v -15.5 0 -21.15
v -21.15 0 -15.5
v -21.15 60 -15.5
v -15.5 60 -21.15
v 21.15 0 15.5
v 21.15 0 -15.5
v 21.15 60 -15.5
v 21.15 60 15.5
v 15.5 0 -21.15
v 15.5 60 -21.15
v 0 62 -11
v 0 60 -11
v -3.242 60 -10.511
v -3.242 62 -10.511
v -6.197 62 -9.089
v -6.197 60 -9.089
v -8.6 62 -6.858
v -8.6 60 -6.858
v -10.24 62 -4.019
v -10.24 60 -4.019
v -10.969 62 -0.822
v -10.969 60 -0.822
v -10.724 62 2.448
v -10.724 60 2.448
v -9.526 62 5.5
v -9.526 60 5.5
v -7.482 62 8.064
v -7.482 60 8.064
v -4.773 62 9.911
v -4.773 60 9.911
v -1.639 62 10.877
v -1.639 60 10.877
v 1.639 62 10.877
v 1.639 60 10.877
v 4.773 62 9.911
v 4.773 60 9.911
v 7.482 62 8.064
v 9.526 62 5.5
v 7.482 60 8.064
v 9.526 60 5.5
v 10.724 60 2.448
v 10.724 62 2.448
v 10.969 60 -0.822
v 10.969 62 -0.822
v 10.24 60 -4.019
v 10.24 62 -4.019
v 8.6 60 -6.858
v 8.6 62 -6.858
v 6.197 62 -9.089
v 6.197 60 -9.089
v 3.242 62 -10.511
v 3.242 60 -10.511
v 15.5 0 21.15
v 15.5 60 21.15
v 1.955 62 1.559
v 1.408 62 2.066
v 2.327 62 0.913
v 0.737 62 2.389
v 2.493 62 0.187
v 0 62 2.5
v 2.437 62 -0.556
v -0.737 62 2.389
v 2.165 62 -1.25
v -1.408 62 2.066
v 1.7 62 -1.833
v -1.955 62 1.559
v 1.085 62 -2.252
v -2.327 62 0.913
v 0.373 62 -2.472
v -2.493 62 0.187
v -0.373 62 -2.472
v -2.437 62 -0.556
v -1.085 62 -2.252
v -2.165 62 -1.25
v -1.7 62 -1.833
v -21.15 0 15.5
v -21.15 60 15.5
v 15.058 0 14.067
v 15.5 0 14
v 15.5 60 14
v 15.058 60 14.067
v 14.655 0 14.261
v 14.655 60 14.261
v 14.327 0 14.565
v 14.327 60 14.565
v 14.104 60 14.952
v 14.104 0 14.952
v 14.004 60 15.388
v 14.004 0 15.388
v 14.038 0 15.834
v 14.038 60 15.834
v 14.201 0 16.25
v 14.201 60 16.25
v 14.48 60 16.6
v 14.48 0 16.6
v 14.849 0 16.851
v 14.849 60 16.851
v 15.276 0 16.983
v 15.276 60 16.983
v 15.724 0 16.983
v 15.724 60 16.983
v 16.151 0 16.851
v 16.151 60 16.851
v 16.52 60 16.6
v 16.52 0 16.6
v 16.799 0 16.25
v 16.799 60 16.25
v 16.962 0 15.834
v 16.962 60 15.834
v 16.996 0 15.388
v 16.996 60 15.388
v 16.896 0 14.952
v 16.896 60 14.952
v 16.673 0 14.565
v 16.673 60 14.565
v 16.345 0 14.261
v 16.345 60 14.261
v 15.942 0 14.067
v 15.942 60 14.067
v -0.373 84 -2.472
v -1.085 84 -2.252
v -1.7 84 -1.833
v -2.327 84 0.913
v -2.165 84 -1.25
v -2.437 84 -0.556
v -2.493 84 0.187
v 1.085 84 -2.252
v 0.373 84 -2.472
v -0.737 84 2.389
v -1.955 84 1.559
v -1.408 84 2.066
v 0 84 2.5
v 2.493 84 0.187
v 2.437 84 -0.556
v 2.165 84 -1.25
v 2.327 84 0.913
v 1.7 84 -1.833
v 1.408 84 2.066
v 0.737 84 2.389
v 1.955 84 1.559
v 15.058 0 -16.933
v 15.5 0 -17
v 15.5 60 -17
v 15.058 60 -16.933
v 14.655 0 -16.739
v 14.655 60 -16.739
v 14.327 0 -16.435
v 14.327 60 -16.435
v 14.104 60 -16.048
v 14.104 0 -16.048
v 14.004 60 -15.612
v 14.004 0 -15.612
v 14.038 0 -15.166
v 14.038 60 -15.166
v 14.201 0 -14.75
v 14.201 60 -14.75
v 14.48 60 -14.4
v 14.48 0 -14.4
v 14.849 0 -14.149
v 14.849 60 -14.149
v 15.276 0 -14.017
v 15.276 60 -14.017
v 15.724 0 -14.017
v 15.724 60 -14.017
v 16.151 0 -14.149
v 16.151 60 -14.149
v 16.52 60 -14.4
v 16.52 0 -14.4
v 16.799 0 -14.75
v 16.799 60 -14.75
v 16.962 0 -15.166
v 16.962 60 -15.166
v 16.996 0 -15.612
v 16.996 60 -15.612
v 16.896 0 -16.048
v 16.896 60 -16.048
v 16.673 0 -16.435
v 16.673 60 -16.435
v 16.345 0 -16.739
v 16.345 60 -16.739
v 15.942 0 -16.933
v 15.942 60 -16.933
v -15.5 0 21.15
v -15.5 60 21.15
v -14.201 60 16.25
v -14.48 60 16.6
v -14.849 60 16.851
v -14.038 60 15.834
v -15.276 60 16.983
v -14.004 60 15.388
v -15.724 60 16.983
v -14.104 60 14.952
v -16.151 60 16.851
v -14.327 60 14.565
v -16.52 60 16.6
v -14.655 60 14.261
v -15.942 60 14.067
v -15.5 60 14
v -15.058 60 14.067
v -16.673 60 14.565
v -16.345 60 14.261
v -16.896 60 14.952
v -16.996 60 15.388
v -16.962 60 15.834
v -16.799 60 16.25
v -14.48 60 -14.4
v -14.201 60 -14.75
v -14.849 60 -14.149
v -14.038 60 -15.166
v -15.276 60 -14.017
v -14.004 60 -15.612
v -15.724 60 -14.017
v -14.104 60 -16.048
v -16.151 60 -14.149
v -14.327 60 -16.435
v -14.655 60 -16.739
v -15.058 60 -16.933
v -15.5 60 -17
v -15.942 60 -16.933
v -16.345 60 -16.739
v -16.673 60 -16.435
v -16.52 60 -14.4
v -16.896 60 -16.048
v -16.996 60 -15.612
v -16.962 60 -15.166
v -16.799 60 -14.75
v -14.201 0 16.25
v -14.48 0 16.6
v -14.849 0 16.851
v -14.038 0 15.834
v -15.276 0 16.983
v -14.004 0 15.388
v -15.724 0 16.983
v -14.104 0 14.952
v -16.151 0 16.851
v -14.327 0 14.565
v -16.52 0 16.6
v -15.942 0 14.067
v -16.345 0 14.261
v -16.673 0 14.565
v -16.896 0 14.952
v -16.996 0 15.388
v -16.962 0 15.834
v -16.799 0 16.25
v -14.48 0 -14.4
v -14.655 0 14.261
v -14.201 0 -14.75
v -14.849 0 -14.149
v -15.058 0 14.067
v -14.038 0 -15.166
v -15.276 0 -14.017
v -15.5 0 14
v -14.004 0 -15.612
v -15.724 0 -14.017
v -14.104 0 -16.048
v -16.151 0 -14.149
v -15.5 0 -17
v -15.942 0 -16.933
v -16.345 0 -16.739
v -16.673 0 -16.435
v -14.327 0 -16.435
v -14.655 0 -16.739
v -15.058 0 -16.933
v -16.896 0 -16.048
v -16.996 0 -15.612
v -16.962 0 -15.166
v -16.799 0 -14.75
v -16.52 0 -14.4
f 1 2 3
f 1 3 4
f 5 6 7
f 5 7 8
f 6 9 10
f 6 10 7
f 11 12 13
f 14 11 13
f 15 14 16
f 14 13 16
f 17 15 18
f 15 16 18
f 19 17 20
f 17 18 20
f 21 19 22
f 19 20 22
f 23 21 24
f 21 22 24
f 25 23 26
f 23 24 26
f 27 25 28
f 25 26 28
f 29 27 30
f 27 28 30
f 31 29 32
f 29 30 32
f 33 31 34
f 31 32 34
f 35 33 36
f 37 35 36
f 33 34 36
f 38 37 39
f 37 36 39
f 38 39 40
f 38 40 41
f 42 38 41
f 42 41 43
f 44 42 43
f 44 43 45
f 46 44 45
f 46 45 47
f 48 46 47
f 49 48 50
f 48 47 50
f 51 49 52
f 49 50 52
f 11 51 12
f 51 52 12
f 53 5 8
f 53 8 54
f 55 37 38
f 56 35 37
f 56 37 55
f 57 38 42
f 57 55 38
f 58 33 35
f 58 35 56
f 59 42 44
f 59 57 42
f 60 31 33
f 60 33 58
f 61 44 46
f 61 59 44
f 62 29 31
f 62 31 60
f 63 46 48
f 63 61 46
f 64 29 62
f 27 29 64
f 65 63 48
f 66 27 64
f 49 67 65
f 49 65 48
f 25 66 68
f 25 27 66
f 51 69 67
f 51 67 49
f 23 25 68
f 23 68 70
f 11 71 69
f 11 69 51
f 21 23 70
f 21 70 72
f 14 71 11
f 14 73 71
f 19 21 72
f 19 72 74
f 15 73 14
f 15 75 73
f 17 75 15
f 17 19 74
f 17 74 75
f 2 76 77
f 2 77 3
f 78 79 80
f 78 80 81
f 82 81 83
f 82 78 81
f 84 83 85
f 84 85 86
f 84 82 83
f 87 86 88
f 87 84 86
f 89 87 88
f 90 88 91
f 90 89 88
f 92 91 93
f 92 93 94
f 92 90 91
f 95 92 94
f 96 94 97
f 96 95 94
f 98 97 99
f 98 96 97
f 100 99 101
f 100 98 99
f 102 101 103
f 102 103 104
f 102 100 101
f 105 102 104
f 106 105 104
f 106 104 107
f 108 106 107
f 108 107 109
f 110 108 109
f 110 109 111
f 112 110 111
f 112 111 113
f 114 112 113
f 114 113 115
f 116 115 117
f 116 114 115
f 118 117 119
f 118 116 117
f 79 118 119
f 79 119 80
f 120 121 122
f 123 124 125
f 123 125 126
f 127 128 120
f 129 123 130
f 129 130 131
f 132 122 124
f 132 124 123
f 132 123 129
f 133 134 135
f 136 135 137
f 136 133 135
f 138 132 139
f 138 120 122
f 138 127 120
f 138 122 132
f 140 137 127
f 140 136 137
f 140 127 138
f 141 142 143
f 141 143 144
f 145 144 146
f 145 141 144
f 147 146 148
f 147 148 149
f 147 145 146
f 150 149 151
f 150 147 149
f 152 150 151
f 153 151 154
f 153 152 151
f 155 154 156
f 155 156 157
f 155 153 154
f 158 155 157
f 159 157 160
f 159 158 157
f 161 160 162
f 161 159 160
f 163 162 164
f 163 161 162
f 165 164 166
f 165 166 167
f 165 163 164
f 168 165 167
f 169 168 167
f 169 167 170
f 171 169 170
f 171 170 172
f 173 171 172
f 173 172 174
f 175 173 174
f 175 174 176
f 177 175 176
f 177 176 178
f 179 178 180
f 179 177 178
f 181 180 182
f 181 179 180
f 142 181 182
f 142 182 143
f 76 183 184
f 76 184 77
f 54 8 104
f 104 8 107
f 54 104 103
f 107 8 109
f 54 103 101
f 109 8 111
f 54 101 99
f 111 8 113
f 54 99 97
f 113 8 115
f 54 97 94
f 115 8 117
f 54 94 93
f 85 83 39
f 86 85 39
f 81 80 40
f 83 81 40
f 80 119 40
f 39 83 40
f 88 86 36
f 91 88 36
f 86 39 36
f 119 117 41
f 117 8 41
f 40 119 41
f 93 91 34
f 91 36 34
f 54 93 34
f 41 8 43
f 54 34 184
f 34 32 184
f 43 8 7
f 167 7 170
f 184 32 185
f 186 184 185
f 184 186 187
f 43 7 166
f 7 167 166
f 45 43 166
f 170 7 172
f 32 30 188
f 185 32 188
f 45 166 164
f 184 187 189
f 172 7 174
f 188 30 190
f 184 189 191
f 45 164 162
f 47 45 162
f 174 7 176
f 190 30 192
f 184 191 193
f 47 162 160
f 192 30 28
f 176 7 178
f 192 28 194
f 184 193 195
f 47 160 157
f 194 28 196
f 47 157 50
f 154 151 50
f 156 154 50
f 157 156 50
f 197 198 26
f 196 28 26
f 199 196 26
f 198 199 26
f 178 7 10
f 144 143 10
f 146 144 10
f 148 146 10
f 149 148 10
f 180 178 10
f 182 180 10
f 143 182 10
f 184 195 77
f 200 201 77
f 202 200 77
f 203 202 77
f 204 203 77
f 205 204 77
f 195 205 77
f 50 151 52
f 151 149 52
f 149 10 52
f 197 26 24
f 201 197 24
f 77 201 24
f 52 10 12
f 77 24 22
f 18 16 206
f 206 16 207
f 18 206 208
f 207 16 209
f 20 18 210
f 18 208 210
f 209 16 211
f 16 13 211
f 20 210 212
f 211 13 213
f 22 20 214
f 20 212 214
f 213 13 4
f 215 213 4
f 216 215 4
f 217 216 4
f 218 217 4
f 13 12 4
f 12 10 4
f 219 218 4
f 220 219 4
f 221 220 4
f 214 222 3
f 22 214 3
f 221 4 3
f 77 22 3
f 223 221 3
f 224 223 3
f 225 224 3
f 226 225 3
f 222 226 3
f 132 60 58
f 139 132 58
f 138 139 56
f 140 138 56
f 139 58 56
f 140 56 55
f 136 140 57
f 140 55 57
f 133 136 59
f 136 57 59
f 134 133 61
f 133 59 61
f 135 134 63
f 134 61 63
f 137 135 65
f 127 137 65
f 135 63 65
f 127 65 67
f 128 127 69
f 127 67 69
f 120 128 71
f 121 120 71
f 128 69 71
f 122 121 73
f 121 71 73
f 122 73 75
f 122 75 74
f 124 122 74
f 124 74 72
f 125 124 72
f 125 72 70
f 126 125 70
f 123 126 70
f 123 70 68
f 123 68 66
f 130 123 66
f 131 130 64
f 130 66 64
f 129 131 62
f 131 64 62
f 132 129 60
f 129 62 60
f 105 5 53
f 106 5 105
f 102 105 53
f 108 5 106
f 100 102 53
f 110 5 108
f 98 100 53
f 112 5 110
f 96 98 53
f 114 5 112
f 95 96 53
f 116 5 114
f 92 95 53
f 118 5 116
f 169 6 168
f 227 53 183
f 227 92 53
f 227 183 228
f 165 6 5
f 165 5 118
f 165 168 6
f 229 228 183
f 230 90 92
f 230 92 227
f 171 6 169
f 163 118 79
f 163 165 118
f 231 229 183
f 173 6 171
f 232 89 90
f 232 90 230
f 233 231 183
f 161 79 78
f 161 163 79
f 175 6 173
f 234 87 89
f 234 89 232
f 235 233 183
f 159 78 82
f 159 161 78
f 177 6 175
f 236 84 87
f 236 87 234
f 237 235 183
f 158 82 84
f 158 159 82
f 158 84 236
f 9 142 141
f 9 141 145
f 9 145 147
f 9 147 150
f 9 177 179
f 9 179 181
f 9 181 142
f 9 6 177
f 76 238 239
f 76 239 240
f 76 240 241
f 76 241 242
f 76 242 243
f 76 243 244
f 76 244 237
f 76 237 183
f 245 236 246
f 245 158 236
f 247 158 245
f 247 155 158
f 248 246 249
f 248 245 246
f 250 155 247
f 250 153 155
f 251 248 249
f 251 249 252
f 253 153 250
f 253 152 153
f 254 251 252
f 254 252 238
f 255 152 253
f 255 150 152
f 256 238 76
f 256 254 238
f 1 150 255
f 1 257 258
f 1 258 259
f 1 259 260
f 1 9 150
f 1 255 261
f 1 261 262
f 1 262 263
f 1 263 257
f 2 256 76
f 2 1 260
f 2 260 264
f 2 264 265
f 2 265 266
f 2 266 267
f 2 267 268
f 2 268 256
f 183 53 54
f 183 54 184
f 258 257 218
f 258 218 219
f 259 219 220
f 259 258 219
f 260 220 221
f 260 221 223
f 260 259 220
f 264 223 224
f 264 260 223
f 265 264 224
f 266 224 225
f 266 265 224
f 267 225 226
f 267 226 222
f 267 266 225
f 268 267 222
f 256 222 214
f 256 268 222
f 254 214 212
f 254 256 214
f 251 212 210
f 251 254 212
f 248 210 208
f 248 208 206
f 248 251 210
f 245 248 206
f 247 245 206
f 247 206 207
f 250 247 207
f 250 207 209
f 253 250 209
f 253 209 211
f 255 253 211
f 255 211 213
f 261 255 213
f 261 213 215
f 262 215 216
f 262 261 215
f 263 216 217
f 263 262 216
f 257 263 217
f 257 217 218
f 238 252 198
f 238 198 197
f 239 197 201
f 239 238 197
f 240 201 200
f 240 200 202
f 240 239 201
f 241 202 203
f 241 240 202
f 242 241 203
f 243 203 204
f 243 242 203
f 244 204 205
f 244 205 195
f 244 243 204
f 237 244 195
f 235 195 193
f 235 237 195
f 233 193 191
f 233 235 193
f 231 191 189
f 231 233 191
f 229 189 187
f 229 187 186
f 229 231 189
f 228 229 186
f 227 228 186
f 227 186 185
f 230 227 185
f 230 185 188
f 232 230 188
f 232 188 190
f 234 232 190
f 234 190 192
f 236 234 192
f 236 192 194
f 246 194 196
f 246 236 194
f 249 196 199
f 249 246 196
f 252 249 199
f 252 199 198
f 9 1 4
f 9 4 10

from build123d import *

# Parameters (mm, degrees)
SKETCH_1_R      = 1.5
EXTRUDE_1_DEPTH = 60
SKETCH_2_R      = 11
EXTRUDE_2_DEPTH = 2
SKETCH_3_R      = 2.5
EXTRUDE_3_DEPTH = 22


with BuildPart() as part:
    # 草圖1 → 填料-伸長1 (new body)
    with BuildSketch(Plane(origin=(0, 0, 0), x_dir=(1, 0, 0), z_dir=(0, 1, 0))):
        Polygon((-15.5, 21.15), (15.5, 21.15), (21.15, 15.5), (21.15, -15.5), (15.5, -21.15), (-15.5, -21.15), (-21.15, -15.5), (-21.15, 15.5), align=None)
        with Locations(Location((-15.5, 15.5, 0), (0, 0, 90))):
            Circle(SKETCH_1_R, mode=Mode.SUBTRACT)
        with Locations(Location((15.5, 15.5, 0), (0, 0, 90))):
            Circle(SKETCH_1_R, mode=Mode.SUBTRACT)
        with Locations(Location((15.5, -15.5, 0), (0, 0, 90))):
            Circle(SKETCH_1_R, mode=Mode.SUBTRACT)
        with Locations(Location((-15.5, -15.5, 0), (0, 0, 90))):
            Circle(SKETCH_1_R, mode=Mode.SUBTRACT)
    extrude(amount=EXTRUDE_1_DEPTH)

    # 草圖2 → 填料-伸長2 (add)
    with BuildSketch(Plane(origin=(0, 60, 0), x_dir=(1, 0, 0), z_dir=(0, 1, 0))):
        with Locations(Location((0, 0, 0), (0, 0, 90))):
            Circle(SKETCH_2_R)
    extrude(amount=EXTRUDE_2_DEPTH)

    # 草圖3 → 填料-伸長3 (add)
    with BuildSketch(Plane(origin=(0, 62, 0), x_dir=(1, 0, 0), z_dir=(0, 1, 0))):
        with Locations(Location((0, 0, 0), (0, 0, 270))):
            Circle(SKETCH_3_R)
    extrude(amount=EXTRUDE_3_DEPTH)


solid = part.part
